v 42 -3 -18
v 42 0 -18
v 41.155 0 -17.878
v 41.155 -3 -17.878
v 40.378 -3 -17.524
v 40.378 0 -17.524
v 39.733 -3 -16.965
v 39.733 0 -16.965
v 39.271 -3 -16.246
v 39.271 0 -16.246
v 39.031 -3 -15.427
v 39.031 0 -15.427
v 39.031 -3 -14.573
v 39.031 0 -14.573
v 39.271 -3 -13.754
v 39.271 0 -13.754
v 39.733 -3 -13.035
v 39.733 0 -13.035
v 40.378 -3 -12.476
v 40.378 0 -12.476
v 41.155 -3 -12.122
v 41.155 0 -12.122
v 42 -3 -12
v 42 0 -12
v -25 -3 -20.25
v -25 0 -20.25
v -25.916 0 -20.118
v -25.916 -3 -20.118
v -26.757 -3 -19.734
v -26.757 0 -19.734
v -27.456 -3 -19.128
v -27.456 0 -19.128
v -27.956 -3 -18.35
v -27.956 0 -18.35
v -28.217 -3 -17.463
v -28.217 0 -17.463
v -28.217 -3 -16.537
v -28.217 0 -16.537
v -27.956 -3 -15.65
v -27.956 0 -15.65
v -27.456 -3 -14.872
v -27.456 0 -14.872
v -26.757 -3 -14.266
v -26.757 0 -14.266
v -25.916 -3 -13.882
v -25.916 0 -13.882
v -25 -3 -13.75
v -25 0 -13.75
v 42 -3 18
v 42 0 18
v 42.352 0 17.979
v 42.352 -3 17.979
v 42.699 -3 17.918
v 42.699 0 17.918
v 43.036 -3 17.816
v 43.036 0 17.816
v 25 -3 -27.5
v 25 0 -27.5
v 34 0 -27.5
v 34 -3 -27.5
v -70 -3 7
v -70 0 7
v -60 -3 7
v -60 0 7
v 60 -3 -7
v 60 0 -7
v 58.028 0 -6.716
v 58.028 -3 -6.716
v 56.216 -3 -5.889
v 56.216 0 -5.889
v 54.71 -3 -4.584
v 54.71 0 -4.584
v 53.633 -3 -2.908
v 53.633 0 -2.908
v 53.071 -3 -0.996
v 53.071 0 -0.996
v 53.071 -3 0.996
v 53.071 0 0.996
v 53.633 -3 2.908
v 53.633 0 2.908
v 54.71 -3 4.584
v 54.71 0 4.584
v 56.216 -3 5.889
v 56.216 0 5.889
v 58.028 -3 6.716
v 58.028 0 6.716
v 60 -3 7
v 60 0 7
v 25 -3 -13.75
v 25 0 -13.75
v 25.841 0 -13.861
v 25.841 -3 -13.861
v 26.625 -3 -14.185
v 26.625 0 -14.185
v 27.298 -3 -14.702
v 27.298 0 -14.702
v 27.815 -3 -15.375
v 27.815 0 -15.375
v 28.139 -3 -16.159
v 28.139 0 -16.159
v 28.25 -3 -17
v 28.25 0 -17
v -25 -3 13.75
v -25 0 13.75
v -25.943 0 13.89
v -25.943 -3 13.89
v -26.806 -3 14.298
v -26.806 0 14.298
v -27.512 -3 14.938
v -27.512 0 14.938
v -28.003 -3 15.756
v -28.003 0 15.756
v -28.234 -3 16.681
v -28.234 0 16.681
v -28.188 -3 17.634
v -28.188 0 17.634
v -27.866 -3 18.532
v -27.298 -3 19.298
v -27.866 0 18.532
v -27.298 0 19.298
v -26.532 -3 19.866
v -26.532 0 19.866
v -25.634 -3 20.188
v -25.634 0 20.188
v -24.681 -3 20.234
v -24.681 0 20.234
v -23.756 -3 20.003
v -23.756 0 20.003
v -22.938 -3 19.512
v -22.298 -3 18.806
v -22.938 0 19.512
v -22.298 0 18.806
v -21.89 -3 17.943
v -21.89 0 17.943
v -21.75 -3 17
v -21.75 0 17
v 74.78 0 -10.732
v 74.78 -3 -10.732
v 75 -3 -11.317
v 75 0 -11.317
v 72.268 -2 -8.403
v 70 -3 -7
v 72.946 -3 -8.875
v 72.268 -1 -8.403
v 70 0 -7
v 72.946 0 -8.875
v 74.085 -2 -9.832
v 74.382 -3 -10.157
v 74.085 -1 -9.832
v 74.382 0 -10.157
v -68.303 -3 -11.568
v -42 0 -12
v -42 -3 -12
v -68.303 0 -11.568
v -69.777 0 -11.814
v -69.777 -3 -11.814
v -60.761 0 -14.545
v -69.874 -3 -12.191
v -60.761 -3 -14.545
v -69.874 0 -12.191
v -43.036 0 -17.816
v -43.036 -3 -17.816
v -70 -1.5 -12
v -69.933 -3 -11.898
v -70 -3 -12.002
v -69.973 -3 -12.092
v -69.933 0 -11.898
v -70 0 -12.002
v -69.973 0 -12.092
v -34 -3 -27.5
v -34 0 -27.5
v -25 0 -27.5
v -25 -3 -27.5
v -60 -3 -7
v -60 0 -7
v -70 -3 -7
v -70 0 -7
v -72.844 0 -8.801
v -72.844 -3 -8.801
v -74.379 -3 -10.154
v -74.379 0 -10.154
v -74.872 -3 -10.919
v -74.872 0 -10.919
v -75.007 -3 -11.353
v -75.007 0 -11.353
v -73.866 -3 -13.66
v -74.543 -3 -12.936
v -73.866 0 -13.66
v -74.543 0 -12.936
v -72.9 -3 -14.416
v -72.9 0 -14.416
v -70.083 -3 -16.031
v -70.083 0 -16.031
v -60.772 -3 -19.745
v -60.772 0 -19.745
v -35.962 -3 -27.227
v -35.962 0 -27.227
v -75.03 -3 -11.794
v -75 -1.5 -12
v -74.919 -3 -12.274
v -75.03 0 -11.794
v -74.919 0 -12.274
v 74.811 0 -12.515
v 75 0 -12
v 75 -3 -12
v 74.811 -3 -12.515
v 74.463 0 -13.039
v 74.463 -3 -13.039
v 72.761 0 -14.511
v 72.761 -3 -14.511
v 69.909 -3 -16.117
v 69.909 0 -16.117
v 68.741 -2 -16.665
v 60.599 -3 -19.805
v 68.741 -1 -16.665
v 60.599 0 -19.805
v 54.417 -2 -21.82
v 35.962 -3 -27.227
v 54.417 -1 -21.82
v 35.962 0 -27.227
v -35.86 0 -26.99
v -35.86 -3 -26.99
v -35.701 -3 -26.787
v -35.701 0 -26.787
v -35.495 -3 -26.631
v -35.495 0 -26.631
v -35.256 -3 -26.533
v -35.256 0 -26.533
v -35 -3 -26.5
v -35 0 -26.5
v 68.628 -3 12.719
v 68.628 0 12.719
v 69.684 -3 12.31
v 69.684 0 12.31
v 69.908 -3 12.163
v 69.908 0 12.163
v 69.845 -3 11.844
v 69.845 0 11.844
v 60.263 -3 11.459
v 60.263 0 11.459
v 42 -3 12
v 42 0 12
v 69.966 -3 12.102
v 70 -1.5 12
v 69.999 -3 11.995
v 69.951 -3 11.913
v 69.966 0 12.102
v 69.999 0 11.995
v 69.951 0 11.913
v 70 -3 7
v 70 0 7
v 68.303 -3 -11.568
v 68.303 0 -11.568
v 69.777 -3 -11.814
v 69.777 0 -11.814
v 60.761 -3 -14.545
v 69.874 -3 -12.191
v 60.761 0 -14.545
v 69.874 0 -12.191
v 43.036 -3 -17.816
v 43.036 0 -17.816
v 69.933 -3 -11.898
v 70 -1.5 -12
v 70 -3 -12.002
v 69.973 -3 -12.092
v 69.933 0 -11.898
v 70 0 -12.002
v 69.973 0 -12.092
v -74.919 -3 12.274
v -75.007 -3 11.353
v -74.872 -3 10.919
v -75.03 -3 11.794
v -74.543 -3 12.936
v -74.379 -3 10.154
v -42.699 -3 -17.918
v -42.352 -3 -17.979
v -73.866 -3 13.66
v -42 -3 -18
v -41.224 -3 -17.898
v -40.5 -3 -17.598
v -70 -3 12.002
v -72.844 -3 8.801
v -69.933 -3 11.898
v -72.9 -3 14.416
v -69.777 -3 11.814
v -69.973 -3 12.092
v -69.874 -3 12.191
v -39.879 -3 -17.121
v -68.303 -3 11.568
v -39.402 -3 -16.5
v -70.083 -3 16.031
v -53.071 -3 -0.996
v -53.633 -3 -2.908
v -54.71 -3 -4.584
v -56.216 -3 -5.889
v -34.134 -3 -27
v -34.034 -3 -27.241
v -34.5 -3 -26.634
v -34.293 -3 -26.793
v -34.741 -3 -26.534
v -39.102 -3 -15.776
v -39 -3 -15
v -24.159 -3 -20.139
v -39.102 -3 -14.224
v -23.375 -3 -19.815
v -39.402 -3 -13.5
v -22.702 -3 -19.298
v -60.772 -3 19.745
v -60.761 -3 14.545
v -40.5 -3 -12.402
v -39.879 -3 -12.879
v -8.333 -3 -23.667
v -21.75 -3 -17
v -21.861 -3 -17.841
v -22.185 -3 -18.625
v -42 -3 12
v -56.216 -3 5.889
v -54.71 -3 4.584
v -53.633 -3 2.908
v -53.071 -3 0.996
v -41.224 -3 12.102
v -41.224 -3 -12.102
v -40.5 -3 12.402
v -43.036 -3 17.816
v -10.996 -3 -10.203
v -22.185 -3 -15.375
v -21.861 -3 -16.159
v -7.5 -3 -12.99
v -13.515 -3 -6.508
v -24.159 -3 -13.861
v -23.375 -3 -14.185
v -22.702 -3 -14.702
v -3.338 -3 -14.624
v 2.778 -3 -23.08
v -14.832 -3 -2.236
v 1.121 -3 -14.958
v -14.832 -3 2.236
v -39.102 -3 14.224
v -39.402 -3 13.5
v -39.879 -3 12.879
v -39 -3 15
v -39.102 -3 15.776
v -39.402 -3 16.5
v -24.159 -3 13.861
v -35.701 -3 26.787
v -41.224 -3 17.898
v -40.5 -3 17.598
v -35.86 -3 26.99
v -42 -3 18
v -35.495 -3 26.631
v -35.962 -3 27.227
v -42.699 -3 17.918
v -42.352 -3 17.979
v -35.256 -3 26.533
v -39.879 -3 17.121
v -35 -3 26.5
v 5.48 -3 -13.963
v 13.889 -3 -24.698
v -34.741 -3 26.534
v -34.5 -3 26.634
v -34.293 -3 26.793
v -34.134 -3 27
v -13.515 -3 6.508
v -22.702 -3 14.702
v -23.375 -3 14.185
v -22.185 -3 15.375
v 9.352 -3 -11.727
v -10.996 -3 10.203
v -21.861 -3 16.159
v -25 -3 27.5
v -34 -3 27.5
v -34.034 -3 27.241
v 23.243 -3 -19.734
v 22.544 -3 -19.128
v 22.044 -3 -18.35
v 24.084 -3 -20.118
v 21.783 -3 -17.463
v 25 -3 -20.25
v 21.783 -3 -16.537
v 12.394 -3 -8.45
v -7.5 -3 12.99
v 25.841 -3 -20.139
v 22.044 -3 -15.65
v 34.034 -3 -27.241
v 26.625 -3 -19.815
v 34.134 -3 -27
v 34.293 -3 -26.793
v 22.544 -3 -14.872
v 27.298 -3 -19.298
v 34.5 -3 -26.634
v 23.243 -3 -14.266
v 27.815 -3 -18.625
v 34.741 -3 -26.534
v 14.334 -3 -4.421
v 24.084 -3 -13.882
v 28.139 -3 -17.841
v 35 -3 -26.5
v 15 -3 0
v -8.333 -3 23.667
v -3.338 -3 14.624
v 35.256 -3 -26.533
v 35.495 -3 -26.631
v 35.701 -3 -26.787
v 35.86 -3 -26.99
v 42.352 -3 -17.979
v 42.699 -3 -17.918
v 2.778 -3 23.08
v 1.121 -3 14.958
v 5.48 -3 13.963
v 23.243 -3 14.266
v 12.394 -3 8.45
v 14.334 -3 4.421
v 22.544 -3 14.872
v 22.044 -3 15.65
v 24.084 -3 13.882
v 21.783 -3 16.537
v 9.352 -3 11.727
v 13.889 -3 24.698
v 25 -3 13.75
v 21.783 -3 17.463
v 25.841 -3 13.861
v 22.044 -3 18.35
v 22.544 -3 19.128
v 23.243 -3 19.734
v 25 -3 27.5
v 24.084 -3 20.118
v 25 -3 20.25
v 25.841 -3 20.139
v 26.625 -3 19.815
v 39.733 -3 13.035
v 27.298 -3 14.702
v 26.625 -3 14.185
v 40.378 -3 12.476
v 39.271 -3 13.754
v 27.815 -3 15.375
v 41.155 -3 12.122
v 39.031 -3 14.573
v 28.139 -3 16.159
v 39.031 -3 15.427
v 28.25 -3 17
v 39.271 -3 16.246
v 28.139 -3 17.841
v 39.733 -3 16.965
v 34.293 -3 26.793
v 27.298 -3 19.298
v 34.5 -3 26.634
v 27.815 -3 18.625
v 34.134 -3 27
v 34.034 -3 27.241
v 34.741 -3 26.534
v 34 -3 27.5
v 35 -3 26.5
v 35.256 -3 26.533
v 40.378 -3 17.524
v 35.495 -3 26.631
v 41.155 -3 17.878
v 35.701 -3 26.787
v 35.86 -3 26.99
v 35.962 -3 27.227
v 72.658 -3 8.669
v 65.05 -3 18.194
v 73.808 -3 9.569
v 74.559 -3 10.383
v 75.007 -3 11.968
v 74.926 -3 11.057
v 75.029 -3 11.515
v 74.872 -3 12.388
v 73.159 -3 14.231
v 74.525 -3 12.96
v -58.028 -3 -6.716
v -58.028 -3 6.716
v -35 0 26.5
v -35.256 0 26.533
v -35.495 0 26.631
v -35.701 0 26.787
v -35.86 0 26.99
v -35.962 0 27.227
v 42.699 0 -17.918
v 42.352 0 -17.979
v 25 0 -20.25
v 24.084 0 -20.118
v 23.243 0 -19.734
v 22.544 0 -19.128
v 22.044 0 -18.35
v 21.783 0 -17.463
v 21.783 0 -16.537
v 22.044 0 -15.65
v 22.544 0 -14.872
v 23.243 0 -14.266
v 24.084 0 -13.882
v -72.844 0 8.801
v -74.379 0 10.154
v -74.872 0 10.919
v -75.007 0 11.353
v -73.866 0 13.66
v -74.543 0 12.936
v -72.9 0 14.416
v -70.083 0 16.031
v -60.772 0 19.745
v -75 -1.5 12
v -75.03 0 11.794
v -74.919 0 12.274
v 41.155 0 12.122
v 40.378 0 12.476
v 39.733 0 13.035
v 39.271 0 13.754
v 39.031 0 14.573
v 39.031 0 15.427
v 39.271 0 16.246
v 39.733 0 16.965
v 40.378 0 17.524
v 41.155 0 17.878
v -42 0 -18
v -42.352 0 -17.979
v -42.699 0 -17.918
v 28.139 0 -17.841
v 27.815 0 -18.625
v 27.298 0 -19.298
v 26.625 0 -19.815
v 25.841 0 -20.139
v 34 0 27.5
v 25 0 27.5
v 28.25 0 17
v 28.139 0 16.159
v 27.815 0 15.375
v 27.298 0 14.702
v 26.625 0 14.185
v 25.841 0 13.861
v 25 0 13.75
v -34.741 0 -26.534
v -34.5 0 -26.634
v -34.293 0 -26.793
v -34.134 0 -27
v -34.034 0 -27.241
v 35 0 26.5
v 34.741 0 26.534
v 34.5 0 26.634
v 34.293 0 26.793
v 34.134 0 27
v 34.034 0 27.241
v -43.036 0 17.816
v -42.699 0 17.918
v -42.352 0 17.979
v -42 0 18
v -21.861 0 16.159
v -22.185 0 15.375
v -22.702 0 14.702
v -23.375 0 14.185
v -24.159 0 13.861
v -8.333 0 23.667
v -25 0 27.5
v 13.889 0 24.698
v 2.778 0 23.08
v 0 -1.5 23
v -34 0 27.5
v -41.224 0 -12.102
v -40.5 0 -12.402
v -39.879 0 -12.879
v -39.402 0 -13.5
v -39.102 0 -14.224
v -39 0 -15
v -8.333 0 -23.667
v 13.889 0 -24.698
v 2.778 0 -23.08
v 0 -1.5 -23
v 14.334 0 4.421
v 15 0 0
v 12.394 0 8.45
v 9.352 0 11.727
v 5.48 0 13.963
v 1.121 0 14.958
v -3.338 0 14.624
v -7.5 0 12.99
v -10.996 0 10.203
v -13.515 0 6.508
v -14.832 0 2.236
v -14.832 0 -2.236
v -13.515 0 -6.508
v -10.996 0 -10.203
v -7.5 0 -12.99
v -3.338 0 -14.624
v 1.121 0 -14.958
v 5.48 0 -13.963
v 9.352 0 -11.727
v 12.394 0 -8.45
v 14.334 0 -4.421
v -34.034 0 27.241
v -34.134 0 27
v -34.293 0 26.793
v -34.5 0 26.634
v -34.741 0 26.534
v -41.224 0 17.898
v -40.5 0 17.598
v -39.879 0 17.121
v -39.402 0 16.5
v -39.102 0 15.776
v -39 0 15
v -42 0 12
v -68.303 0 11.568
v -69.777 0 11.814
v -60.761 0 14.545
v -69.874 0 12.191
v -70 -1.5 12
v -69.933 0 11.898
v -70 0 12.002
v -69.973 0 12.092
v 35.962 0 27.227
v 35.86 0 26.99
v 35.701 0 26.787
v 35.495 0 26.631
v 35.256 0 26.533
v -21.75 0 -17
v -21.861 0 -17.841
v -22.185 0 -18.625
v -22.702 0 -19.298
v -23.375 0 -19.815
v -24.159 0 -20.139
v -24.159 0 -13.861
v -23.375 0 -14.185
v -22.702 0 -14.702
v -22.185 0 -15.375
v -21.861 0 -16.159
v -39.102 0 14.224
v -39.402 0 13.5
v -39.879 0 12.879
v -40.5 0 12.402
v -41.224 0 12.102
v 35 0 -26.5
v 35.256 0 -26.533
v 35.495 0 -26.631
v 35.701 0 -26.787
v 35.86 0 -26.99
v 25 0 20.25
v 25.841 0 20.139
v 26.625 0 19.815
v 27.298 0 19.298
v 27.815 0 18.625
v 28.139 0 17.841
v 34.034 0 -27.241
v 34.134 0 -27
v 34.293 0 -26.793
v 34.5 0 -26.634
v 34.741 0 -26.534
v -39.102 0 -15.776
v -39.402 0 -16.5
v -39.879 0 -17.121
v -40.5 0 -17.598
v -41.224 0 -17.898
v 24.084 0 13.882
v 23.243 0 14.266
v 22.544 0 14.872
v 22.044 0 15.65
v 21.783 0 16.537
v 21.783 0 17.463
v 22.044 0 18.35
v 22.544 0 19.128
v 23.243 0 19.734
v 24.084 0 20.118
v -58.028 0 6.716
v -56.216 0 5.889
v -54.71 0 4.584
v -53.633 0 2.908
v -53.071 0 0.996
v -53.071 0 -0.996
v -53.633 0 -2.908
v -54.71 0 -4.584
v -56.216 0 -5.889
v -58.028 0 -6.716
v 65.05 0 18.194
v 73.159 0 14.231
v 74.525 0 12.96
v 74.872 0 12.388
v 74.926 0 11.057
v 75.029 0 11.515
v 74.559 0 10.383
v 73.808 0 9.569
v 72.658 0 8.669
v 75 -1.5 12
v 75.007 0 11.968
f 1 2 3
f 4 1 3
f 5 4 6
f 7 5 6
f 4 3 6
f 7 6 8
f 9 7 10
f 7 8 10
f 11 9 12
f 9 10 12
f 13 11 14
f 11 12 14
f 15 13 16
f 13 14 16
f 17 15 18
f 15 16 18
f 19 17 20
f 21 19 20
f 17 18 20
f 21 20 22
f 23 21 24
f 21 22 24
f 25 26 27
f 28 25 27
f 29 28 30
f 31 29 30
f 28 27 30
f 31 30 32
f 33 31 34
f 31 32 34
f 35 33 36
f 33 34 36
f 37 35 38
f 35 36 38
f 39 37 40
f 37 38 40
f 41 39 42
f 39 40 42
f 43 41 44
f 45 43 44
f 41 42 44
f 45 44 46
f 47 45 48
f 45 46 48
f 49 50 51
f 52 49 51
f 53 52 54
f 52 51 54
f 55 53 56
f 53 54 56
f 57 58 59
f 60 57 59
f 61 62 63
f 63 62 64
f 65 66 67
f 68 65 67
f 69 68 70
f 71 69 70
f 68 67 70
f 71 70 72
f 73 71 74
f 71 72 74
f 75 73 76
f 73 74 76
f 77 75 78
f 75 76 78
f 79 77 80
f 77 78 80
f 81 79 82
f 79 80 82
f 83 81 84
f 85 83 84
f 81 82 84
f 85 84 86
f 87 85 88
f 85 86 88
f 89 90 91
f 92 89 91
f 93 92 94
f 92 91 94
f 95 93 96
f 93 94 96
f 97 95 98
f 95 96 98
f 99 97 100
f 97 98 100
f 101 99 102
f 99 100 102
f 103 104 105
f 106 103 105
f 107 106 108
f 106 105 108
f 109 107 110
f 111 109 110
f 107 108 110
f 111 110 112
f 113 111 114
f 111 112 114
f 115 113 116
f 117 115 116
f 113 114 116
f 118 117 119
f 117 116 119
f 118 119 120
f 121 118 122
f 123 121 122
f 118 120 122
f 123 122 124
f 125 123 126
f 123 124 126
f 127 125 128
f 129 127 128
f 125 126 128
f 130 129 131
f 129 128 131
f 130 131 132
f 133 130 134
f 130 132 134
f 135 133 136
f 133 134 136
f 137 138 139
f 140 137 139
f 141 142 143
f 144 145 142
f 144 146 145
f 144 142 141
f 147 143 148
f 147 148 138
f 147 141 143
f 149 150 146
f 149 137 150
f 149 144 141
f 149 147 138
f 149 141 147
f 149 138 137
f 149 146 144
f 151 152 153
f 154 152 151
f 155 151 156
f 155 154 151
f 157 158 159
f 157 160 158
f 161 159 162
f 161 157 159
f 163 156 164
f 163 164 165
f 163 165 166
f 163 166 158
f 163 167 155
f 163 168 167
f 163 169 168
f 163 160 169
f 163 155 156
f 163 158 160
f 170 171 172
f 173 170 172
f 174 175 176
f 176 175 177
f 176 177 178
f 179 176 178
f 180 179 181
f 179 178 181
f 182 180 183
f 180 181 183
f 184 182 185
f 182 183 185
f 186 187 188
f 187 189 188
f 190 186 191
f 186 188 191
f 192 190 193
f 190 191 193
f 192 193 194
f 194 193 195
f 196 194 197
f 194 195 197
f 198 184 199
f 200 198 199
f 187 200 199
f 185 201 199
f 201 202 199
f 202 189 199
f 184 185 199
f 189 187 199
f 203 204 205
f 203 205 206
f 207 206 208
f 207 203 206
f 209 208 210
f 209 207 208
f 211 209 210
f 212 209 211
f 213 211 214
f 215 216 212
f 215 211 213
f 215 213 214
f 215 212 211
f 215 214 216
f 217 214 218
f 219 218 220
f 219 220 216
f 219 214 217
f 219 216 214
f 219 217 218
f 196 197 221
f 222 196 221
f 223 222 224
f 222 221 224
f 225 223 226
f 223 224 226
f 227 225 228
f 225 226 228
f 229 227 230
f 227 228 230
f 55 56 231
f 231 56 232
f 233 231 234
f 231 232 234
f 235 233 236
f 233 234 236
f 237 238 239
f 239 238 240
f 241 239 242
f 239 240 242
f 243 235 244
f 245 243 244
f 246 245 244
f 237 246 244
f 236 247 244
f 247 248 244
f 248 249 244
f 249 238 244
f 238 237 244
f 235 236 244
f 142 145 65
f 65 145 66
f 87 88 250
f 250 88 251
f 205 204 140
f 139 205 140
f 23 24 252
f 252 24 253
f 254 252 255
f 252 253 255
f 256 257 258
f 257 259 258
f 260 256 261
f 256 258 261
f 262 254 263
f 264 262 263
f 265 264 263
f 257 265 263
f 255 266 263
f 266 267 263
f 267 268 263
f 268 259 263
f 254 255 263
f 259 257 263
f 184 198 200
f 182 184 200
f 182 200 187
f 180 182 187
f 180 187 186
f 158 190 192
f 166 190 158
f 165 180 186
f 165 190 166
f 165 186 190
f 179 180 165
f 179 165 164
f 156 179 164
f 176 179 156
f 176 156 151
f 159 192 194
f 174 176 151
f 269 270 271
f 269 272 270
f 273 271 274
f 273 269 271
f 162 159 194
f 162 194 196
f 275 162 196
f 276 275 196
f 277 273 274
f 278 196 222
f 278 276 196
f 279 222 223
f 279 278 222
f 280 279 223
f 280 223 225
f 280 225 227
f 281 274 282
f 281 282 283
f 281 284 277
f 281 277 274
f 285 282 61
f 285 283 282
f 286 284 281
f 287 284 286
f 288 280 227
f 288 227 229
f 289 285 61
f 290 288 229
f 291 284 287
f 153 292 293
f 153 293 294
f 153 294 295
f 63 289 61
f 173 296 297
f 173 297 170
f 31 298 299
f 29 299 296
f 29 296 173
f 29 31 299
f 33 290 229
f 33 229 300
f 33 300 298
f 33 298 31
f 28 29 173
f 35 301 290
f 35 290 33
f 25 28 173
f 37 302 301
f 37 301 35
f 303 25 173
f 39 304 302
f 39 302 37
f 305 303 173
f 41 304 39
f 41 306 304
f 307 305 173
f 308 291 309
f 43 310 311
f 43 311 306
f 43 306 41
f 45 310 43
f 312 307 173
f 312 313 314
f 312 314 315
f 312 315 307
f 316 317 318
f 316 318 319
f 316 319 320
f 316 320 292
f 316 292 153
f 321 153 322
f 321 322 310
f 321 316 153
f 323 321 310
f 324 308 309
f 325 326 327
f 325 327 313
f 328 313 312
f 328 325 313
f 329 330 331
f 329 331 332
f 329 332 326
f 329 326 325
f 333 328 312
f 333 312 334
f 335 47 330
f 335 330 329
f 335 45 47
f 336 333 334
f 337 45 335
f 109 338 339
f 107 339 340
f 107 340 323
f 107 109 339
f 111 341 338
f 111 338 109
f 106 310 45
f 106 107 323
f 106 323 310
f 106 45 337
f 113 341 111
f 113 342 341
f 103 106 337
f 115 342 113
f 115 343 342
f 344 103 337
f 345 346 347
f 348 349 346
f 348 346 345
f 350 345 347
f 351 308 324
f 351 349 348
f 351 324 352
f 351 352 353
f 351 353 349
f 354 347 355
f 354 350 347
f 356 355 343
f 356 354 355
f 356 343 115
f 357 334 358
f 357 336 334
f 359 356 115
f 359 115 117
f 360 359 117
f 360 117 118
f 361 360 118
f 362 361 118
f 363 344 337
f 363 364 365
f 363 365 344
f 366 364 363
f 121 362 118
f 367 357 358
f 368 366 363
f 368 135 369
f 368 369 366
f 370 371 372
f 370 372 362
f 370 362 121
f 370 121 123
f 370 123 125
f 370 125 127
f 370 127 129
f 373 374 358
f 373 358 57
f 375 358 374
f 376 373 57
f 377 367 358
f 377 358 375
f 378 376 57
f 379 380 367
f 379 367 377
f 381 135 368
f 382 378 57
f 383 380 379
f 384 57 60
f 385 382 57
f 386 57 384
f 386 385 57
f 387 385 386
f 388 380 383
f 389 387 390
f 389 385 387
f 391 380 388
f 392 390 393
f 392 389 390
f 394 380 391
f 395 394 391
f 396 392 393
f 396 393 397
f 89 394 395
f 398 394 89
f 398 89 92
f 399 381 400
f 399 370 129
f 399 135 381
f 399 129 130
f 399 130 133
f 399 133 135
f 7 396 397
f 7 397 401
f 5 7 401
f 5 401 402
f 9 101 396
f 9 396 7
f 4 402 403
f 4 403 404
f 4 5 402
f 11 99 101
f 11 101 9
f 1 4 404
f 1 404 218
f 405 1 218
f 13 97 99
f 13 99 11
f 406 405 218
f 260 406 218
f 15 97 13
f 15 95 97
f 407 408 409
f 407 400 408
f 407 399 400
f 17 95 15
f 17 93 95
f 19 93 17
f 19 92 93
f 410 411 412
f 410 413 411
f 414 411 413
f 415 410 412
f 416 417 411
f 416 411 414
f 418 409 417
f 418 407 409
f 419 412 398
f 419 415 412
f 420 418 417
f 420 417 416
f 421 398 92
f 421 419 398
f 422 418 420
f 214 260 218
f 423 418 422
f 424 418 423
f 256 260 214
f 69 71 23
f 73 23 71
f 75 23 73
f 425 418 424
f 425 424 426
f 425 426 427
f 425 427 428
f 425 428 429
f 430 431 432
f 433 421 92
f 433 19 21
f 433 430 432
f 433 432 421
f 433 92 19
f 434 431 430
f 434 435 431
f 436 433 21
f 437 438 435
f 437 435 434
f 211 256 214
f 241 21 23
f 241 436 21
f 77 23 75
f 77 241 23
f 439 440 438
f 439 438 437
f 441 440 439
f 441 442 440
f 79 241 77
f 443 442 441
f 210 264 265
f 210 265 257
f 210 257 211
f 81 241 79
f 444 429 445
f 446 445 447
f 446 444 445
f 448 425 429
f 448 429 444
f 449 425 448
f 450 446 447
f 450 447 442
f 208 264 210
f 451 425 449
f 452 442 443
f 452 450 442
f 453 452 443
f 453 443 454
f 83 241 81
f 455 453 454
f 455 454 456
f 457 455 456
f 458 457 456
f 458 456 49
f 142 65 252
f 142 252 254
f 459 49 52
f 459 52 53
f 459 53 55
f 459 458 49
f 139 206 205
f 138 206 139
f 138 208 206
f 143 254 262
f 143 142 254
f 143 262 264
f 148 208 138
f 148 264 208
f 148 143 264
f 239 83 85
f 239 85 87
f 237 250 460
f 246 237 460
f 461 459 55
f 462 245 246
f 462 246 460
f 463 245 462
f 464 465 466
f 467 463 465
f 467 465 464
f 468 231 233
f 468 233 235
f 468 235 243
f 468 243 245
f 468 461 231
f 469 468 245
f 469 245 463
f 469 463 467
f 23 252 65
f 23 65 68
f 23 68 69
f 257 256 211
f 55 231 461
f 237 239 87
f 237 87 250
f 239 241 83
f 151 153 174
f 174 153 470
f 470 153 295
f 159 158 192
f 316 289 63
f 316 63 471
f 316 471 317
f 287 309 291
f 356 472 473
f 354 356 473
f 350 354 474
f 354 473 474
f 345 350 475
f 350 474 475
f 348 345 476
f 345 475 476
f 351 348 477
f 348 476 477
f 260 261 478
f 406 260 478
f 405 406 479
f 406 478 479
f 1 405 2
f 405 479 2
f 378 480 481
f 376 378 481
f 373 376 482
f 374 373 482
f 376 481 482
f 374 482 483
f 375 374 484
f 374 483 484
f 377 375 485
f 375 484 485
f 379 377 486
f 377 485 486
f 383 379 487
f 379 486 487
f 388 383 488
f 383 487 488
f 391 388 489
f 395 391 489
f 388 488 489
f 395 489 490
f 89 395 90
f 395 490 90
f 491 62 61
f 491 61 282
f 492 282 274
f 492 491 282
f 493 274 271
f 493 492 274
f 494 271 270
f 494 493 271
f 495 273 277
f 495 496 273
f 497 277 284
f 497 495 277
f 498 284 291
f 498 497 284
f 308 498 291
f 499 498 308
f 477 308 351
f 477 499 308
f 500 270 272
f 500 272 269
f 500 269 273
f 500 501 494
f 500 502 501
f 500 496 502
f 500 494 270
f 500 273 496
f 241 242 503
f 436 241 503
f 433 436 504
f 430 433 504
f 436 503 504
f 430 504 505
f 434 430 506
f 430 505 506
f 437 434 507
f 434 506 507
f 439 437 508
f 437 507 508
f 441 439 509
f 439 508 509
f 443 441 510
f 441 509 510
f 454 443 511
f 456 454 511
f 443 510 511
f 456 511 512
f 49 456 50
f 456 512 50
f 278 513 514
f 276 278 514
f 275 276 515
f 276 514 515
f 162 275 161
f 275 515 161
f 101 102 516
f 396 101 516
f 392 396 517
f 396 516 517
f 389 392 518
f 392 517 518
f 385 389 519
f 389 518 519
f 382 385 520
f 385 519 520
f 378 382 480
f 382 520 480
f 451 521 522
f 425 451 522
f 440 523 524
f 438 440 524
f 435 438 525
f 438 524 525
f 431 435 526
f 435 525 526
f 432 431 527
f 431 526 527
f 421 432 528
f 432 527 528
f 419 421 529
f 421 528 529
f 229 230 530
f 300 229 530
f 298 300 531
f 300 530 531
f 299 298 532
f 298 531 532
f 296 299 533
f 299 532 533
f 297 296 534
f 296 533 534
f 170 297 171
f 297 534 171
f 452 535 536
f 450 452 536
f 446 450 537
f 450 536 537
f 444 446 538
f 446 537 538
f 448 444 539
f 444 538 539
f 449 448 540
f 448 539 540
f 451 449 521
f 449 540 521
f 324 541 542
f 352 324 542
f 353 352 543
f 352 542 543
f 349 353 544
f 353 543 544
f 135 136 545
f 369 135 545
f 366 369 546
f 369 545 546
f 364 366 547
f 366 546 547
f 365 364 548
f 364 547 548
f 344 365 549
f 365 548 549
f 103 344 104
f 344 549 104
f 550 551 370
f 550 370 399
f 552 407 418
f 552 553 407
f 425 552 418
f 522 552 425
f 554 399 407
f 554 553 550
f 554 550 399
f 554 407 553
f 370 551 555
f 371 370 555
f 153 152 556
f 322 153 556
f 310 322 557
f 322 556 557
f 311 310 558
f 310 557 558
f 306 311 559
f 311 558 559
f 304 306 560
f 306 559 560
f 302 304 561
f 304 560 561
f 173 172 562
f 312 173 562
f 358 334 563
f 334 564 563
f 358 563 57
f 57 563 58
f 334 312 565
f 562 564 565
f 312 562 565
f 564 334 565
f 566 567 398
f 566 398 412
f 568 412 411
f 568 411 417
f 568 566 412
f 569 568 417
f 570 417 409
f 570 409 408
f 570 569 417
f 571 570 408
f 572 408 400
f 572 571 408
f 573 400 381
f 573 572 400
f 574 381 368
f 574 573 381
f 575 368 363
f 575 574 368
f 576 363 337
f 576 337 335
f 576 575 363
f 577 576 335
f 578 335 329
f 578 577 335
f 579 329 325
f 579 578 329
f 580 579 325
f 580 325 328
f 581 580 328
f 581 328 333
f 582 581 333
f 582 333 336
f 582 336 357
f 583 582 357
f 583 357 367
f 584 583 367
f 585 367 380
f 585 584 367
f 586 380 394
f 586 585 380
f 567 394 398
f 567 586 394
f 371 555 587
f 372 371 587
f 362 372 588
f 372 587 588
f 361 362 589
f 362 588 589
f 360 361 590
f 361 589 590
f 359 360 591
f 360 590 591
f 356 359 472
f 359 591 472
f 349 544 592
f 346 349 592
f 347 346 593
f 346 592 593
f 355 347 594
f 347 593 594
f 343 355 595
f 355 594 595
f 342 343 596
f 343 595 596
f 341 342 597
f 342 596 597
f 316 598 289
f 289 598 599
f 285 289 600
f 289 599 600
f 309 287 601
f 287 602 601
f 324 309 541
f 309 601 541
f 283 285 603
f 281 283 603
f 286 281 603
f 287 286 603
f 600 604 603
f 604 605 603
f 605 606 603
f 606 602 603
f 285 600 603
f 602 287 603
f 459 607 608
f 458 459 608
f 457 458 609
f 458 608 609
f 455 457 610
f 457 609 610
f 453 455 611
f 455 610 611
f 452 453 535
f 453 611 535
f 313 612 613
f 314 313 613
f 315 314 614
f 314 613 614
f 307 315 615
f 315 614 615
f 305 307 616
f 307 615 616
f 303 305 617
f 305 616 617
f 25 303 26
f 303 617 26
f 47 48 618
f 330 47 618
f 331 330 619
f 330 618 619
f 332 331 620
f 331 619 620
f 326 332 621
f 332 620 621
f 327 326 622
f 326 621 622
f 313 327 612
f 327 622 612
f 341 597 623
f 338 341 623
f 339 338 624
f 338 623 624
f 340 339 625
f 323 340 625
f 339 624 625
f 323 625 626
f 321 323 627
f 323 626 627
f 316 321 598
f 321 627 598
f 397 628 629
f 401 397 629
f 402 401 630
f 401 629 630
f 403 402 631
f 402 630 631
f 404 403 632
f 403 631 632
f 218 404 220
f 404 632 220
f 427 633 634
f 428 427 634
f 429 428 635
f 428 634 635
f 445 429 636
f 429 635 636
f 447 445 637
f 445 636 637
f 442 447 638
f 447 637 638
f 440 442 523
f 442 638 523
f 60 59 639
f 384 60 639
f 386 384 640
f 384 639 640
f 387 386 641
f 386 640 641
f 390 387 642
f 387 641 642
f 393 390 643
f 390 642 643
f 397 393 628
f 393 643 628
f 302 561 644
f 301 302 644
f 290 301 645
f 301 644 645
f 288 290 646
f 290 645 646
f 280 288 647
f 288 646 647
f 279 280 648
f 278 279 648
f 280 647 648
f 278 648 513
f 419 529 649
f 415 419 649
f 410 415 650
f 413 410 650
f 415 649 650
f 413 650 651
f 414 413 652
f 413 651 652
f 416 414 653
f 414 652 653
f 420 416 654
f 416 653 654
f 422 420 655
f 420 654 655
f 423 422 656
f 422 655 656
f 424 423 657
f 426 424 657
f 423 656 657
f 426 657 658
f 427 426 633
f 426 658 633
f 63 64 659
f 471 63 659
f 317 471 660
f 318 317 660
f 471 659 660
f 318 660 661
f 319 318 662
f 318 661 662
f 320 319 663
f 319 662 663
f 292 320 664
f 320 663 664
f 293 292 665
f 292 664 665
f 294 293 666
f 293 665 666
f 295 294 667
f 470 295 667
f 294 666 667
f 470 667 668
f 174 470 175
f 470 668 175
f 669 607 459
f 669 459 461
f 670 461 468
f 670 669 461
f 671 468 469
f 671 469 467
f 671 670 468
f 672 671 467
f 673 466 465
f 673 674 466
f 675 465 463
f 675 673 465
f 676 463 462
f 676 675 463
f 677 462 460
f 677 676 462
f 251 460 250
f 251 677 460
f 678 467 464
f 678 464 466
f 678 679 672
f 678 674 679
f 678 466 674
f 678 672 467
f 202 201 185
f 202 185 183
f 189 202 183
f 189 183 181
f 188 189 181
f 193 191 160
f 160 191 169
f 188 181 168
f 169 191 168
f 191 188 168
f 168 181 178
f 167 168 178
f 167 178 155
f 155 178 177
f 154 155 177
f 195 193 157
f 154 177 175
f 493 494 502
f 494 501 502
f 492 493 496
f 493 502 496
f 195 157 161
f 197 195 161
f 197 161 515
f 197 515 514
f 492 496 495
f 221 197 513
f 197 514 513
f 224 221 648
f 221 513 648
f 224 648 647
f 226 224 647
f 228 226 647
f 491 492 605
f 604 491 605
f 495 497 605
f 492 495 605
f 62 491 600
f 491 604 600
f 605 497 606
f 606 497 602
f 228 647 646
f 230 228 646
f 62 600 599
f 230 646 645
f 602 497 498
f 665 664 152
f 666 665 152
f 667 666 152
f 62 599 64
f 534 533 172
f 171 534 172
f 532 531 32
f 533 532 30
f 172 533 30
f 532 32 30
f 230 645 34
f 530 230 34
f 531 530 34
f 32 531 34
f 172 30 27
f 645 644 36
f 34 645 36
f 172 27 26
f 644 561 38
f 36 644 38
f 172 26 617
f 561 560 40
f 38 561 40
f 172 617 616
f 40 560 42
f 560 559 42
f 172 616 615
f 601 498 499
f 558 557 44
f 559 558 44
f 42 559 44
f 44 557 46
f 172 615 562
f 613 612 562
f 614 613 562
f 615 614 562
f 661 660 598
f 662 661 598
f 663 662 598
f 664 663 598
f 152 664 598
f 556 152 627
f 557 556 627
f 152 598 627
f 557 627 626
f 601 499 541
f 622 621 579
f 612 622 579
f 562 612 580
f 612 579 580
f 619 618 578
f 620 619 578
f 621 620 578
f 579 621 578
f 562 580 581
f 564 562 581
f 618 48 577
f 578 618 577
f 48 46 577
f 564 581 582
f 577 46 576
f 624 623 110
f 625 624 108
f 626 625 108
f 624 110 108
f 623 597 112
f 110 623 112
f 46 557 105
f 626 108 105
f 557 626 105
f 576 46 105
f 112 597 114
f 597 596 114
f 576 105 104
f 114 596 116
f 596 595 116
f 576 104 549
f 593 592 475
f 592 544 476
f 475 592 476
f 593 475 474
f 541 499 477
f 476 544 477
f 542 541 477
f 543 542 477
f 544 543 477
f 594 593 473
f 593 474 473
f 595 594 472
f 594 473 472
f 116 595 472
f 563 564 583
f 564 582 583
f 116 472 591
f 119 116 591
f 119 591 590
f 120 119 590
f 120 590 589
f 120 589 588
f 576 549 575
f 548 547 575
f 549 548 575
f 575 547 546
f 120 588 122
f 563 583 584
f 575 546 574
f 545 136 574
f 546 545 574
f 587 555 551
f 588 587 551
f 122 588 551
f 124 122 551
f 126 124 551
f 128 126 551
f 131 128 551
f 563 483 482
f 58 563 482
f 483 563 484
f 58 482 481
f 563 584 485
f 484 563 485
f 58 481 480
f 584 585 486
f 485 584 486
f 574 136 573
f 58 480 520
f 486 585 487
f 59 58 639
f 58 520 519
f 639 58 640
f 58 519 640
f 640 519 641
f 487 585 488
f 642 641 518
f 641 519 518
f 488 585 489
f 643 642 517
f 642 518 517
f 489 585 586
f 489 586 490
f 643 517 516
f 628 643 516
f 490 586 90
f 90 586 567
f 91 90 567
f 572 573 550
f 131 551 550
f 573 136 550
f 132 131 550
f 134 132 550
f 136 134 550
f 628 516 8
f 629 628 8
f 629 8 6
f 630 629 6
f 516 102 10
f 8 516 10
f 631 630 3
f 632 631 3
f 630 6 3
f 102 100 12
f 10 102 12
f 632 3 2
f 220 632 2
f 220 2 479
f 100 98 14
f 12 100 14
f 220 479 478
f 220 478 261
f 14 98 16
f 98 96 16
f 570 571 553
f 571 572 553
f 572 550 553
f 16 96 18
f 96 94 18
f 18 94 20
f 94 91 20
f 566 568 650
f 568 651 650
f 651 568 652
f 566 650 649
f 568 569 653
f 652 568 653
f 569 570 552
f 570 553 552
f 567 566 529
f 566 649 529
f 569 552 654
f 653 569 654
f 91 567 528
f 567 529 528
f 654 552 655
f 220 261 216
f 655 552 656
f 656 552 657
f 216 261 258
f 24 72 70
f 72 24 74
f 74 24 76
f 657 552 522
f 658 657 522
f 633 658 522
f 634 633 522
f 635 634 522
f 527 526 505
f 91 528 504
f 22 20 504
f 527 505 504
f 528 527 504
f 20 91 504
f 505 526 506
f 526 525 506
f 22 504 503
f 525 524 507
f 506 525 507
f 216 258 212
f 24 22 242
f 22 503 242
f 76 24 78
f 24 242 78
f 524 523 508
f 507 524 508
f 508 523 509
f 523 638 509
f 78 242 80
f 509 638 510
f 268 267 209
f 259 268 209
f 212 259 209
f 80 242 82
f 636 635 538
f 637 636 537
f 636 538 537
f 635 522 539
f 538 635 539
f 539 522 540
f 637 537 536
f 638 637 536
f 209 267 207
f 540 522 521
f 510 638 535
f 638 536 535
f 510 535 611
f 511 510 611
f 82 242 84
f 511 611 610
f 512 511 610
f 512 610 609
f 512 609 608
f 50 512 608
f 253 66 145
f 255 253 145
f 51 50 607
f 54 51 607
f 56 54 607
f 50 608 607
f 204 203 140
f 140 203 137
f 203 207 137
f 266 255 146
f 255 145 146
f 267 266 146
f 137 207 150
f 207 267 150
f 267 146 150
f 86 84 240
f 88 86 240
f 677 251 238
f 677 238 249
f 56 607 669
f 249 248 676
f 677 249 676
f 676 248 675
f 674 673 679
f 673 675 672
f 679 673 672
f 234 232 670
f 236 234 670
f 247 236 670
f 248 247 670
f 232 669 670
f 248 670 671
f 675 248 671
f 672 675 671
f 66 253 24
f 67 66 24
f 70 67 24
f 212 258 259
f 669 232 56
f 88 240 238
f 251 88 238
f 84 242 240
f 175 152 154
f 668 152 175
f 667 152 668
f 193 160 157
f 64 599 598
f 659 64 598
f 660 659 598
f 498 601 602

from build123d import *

# Parameters (mm, degrees)
F0_R     = 15
F1_DEPTH = 3
F2_DEPTH = 3
F3_DEPTH = 3


with BuildPart() as f1:
    # F0 (on Front) → F1 (new body)
    with BuildSketch(Plane.XZ):
        with BuildLine():
            ThreePointArc((-34, 27.5), (-34.2928932188, 26.7928932188), (-35, 26.5))
            Line((-35, 26.5), (-35, -26.5))
            ThreePointArc((-35, -26.5), (-34.2928932188, -26.7928932188), (-34, -27.5))
            Line((-34, -27.5), (-25, -27.5))
            add(Edge.make_bspline(
                [(-25, -27.5), (-16.6666666667, -25.25), (0, -20.75), (16.6666666667, -25.25), (25, -27.5)],
                knots=[0, 0, 0, 0, 0.5, 1, 1, 1, 1], degree=3))
            Line((25, -27.5), (34, -27.5))
            ThreePointArc((34, -27.5), (34.2928932188, -26.7928932188), (35, -26.5))
            Line((35, -26.5), (35, 26.5))
            ThreePointArc((35, 26.5), (34.2928932188, 26.7928932188), (34, 27.5))
            Line((34, 27.5), (25, 27.5))
            add(Edge.make_bspline(
                [(-25, 27.5), (-16.6666666667, 25.25), (0, 20.75), (16.6666666667, 25.25), (25, 27.5)],
                knots=[0, 0, 0, 0, 0.5, 1, 1, 1, 1], degree=3))
            Line((-25, 27.5), (-34, 27.5))
        make_face()
        with BuildLine():
            ThreePointArc((-21.75, -17), (-22.7019029611, -19.2980970389), (-25, -20.25))
            ThreePointArc((-25, -20.25), (-28.25, -17), (-25, -13.75))
            ThreePointArc((-25, -13.75), (-22.7019029611, -14.7019029611), (-21.75, -17))
        make_face(mode=Mode.SUBTRACT)
        with BuildLine():
            ThreePointArc((25, -13.75), (27.2980970389, -14.7019029611), (28.25, -17))
            ThreePointArc((28.25, -17), (27.2980970389, -19.2980970389), (25, -20.25))
            ThreePointArc((25, -20.25), (21.75, -17), (25, -13.75))
        make_face(mode=Mode.SUBTRACT)
        with BuildLine():
            ThreePointArc((-25, 13.75), (-27.2980970389, 19.2980970389), (-21.75, 17))
            ThreePointArc((-21.75, 17), (-22.7019029611, 14.7019029611), (-25, 13.75))
        make_face(mode=Mode.SUBTRACT)
        Circle(F0_R, mode=Mode.SUBTRACT)
        with BuildLine():
            ThreePointArc((25, 13.75), (21.75, 17), (25, 20.25))
            ThreePointArc((25, 20.25), (27.2980970389, 19.2980970389), (28.25, 17))
            ThreePointArc((28.25, 17), (27.2980970389, 14.7019029611), (25, 13.75))
        make_face(mode=Mode.SUBTRACT)
    extrude(amount=F1_DEPTH)

    # F0 (on Front) → F2 (join)
    with BuildSketch(Plane.XZ):
        with BuildLine():
            Line((-35, -26.5), (-35, 26.5))
            ThreePointArc((-35, 26.5), (-35.6028912237, 26.7021766033), (-35.9620014479, 27.2269556553))
            add(Edge.make_bspline(
                [(-70, 7), (-72.688876213, 8.6044405487), (-81.8919167368, 14.0958541424), (-55.1711599351, 21.7740976852), (-35.9620014479, 27.2269556553)],
                knots=[0, 0, 0, 0, 0.2887611513, 0.9883238821, 0.9883238821, 0.9883238821, 0.9883238821], degree=3))
            Line((-70, 7), (-60, 7))
            ThreePointArc((-60, 7), (-53, 0), (-60, -7))
            Line((-60, -7), (-70, -7))
            add(Edge.make_bspline(
                [(-70, -7), (-72.688876213, -8.6044405487), (-81.8919167368, -14.0958541424), (-55.1711599351, -21.7740976852), (-35.9620014479, -27.2269556553)],
                knots=[0, 0, 0, 0, 0.2887611513, 0.9883238821, 0.9883238821, 0.9883238821, 0.9883238821], degree=3))
            ThreePointArc((-35.9620014479, -27.2269556553), (-35.6028912237, -26.7021766033), (-35, -26.5))
        make_face()
        with BuildLine():
            add(Edge.make_bspline(
                [(-42, -12), (-55.9479149703, -11.5083551498), (-83.6545328023, -10.5317349163), (-56.7348192901, -15.3750907079), (-43.0358354206, -17.8155008402)],
                knots=[0, 0, 0, 0, 0.497194072, 0.9876433983, 0.9876433983, 0.9876433983, 0.9876433983], degree=3))
            ThreePointArc((-42, -12), (-39.8786796564, -12.8786796564), (-39, -15))
            ThreePointArc((-39, -15), (-39.8786796564, -17.1213203436), (-42, -18))
            ThreePointArc((-42, -18), (-42.5260691396, -17.9535150686), (-43.0358354206, -17.8155008402))
        make_face(mode=Mode.SUBTRACT)
        with BuildLine():
            ThreePointArc((-39, 15), (-39.8786796564, 12.8786796564), (-42, 12))
            add(Edge.make_bspline(
                [(-42, 12), (-55.9479149703, 11.5083551498), (-83.6545328023, 10.5317349163), (-56.7348192901, 15.3750907079), (-43.0358354206, 17.8155008402)],
                knots=[0, 0, 0, 0, 0.497194072, 0.9876433983, 0.9876433983, 0.9876433983, 0.9876433983], degree=3))
            ThreePointArc((-43.0358354206, 17.8155008402), (-42.5260691396, 17.9535150686), (-42, 18))
            ThreePointArc((-42, 18), (-39.8786796564, 17.1213203436), (-39, 15))
        make_face(mode=Mode.SUBTRACT)
    extrude(amount=F2_DEPTH)

    # F0 (on Front) → F3 (join)
    with BuildSketch(Plane.XZ):
        with BuildLine():
            ThreePointArc((35.9620014479, 27.2269556553), (35.6028912237, 26.7021766033), (35, 26.5))
            Line((35, 26.5), (35, -26.5))
            ThreePointArc((35, -26.5), (35.6028912237, -26.7021766033), (35.9620014479, -27.2269556553))
            add(Edge.make_bspline(
                [(75, -12), (74.084843936, -16.3392264677), (55.1711599351, -21.7740976852), (35.9620014479, -27.2269556553)],
                knots=[0.2887611513, 0.2887611513, 0.2887611513, 0.2887611513, 0.9883238821, 0.9883238821, 0.9883238821, 0.9883238821], degree=3))
            Line((75, -12), (75, -11.3173106911))
            add(Edge.make_bspline(
                [(70, -7), (72.3428093254, -8.3979439668), (74.6856186508, -9.7958879337), (75, -11.3173106911)],
                knots=[0, 0, 0, 0, 0.2515966763, 0.2515966763, 0.2515966763, 0.2515966763], degree=3))
            Line((70, -7), (60, -7))
            ThreePointArc((60, -7), (53, 0), (60, 7))
            Line((60, 7), (70, 7))
            add(Edge.make_bspline(
                [(35.9620014479, 27.2269556553), (55.1711599351, 21.7740976852), (81.8919167368, 14.0958541424), (72.688876213, 8.6044405487), (70, 7)],
                knots=[0.0116761179, 0.0116761179, 0.0116761179, 0.0116761179, 0.7112388487, 1, 1, 1, 1], degree=3))
        make_face()
        with BuildLine():
            ThreePointArc((42, -18), (39, -15), (42, -12))
            add(Edge.make_bspline(
                [(42, -12), (55.9479149703, -11.5083551498), (83.6545328023, -10.5317349163), (56.7348192901, -15.3750907079), (43.0358354206, -17.8155008402)],
                knots=[0, 0, 0, 0, 0.497194072, 0.9876433983, 0.9876433983, 0.9876433983, 0.9876433983], degree=3))
            ThreePointArc((43.0358354206, -17.8155008402), (42.5260691396, -17.9535150686), (42, -18))
        make_face(mode=Mode.SUBTRACT)
        with BuildLine():
            add(Edge.make_bspline(
                [(43.0358354206, 17.8155008402), (56.7348192901, 15.3750907079), (83.6545328023, 10.5317349163), (55.9479149703, 11.5083551498), (42, 12)],
                knots=[0.0123566017, 0.0123566017, 0.0123566017, 0.0123566017, 0.502805928, 1, 1, 1, 1], degree=3))
            ThreePointArc((42, 12), (39, 15), (42, 18))
            ThreePointArc((42, 18), (42.5260691396, 17.9535150686), (43.0358354206, 17.8155008402))
        make_face(mode=Mode.SUBTRACT)
    extrude(amount=F3_DEPTH)


solid = f1.part
